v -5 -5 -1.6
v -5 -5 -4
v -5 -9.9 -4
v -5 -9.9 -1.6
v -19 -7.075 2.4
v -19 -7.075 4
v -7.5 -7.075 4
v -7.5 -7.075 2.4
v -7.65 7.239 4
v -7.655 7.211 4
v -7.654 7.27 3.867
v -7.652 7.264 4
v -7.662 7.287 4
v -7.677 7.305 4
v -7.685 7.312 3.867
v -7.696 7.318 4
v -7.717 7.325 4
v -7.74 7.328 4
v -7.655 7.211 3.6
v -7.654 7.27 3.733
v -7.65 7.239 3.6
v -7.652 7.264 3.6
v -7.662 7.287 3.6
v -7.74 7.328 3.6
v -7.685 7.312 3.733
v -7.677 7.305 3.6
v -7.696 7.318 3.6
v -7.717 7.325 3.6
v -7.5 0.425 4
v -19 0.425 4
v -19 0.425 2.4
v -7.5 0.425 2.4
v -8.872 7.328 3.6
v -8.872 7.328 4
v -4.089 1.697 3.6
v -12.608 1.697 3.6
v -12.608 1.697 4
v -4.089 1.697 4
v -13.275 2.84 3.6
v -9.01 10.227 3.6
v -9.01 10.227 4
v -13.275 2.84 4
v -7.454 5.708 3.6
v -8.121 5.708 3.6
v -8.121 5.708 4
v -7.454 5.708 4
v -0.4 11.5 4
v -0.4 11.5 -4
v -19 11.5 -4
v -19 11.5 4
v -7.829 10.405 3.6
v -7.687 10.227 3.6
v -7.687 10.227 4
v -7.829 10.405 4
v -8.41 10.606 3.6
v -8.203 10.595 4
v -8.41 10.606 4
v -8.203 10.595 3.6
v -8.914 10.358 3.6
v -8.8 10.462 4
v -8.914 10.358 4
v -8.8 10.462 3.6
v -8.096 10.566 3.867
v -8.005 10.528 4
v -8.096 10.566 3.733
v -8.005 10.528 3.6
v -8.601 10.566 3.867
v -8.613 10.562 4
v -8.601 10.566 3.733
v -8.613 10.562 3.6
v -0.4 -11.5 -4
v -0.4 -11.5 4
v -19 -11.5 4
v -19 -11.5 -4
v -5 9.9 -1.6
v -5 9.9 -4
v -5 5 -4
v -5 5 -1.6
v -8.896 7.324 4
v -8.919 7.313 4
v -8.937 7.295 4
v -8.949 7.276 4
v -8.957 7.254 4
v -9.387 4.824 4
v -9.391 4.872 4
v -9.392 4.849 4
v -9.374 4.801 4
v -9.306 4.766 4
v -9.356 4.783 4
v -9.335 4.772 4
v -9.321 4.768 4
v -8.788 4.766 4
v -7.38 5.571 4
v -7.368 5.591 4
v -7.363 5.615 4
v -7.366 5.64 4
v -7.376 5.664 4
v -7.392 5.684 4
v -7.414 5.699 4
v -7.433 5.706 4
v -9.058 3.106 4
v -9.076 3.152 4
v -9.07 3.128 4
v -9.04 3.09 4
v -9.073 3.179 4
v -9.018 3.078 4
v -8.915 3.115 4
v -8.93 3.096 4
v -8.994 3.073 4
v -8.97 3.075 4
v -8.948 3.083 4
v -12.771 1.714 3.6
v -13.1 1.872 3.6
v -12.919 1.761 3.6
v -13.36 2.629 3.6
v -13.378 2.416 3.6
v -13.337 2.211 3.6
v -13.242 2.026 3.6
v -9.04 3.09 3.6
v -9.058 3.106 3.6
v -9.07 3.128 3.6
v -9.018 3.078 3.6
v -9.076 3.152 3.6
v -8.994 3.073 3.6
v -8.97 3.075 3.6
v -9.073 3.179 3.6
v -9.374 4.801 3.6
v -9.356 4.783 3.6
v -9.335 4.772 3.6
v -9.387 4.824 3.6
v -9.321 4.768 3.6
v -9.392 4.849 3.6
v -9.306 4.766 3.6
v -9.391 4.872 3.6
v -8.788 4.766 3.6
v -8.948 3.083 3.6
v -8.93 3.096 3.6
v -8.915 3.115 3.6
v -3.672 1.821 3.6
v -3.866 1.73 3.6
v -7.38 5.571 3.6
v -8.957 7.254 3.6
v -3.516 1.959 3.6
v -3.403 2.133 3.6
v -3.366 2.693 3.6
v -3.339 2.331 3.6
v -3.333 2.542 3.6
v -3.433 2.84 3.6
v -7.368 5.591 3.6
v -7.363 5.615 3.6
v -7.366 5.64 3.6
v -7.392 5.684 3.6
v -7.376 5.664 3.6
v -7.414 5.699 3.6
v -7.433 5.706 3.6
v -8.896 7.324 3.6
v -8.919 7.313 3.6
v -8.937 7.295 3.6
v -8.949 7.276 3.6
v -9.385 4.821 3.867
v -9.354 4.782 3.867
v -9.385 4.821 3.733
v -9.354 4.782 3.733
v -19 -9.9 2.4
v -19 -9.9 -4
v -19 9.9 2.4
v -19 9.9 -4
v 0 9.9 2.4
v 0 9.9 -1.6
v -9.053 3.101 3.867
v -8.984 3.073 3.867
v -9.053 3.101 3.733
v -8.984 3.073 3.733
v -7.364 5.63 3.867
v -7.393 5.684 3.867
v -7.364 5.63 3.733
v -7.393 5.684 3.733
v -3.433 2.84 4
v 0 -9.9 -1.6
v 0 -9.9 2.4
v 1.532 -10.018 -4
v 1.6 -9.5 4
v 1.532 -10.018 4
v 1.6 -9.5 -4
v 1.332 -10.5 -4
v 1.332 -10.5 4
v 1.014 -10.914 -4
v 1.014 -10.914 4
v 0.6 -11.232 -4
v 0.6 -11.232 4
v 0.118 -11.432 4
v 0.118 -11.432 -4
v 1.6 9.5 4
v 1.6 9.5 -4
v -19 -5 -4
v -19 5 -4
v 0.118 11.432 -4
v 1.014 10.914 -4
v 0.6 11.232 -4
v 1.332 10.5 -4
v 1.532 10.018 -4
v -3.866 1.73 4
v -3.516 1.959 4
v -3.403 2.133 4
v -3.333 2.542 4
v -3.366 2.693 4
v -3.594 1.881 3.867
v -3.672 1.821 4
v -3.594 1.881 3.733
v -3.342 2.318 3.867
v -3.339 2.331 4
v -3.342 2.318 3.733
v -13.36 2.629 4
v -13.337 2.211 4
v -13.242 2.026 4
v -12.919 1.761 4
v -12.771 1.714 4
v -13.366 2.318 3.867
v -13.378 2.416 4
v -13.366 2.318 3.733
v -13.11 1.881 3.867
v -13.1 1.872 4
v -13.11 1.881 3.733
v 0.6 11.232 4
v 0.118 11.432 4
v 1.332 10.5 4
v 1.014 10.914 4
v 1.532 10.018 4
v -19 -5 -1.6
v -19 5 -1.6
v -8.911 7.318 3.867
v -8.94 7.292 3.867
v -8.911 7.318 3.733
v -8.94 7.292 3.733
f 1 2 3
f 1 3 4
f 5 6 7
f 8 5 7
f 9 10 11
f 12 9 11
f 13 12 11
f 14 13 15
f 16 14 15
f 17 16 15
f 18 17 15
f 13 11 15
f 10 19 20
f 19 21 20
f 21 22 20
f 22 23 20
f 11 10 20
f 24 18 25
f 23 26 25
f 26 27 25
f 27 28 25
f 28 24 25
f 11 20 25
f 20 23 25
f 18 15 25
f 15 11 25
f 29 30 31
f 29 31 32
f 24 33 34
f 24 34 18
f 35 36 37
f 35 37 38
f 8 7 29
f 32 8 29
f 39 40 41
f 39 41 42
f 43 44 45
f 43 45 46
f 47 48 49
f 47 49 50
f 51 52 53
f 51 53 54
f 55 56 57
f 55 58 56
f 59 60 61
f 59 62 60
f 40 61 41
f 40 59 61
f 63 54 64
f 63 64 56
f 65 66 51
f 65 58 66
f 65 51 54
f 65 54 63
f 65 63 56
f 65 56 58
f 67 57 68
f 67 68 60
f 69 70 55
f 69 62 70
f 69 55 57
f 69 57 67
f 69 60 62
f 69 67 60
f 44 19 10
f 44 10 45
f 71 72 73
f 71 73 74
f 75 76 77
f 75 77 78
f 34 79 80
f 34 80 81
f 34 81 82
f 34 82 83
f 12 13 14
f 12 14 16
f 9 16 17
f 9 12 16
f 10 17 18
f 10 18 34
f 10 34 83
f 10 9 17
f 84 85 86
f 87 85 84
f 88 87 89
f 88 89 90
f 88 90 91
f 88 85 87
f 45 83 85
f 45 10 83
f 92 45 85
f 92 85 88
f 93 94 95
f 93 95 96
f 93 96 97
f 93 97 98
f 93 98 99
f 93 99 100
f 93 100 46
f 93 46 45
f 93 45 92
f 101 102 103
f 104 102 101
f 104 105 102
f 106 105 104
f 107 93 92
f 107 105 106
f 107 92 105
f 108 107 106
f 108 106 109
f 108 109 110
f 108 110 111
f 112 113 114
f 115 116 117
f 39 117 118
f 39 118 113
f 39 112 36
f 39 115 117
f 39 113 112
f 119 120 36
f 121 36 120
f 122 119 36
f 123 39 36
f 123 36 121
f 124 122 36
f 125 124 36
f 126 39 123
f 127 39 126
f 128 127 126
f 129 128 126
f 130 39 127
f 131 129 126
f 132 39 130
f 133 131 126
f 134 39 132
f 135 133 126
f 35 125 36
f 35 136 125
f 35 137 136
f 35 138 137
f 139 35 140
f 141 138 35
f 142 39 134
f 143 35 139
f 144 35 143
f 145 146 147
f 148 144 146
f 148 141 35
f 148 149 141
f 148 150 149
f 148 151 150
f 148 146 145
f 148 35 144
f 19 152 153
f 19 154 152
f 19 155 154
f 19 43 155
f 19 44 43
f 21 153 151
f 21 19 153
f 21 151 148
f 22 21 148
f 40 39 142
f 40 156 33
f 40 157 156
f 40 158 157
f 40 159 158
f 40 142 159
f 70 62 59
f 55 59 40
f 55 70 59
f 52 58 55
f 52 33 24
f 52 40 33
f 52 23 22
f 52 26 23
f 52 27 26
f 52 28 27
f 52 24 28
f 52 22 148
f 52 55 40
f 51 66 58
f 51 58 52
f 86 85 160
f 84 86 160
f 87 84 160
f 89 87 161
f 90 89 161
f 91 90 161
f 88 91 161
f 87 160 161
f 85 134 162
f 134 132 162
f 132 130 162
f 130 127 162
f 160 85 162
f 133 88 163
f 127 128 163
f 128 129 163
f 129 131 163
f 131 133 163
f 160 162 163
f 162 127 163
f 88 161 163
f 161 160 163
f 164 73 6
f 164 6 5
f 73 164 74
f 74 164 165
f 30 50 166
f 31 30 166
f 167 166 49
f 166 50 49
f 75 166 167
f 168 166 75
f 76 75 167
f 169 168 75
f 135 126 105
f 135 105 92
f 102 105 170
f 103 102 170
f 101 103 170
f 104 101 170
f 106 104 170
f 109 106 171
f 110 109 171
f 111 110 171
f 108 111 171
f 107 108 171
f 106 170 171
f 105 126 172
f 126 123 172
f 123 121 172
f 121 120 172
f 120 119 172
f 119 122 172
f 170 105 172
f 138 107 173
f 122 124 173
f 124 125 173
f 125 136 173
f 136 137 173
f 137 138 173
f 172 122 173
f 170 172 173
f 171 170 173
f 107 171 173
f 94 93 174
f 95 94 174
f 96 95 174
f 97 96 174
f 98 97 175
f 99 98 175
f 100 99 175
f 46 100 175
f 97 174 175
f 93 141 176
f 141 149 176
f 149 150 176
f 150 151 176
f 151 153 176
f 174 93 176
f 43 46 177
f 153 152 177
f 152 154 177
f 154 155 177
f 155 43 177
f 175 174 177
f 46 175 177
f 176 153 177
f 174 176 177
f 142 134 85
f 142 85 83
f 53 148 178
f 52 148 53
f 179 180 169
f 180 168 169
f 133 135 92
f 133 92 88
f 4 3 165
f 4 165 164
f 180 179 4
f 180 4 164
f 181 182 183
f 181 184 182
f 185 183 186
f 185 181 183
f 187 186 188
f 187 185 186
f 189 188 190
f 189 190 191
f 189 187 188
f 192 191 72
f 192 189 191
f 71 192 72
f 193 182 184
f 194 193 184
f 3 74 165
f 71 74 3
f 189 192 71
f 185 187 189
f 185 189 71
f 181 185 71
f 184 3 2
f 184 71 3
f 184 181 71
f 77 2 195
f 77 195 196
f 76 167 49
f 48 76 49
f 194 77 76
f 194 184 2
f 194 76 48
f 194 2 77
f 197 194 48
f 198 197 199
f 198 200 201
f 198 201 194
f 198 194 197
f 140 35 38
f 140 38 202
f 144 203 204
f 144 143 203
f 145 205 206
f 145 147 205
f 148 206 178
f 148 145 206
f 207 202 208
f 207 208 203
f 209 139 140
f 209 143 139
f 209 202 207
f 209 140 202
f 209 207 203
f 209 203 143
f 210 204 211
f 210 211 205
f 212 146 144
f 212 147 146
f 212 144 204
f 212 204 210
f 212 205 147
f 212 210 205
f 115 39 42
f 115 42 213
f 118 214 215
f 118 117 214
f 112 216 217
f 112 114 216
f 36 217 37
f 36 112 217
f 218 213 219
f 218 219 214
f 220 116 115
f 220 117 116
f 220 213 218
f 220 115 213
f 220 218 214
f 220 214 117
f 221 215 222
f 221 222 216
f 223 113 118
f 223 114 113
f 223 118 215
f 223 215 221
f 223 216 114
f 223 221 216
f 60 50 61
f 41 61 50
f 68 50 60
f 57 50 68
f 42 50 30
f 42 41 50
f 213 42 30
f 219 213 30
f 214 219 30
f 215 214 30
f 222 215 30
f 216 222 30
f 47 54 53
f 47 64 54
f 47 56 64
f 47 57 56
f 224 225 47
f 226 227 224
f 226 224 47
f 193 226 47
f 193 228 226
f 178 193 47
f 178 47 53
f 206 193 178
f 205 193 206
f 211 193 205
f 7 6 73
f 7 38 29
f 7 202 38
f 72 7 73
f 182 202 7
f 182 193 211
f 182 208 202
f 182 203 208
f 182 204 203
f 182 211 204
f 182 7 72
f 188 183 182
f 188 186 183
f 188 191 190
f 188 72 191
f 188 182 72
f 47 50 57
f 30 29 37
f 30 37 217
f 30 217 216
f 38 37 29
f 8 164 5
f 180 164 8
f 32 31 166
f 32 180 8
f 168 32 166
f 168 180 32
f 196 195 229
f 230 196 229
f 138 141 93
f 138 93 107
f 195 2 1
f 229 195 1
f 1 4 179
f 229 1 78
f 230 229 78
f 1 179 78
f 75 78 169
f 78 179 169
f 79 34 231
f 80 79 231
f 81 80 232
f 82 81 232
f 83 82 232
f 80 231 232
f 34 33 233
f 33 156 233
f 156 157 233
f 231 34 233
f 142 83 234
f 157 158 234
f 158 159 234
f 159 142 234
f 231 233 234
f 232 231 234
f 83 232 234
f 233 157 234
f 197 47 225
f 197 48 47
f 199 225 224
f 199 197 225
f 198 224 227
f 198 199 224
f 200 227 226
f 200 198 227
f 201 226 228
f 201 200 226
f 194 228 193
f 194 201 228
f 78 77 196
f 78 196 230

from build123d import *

# Parameters (mm, degrees)
ESQUISSE1_W             = 8
ESQUISSE1_H             = 23
BOSS_EXTRU_1_DEPTH      = 1.6
ESQUISSE2_W             = 2.4
ESQUISSE2_H             = 10
BOSS_EXTRU_2_DEPTH      = 19
ESQUISSE3_W             = 2.4
ESQUISSE3_H             = 19.8
BOSS_EXTRU_3_DEPTH      = 5
ENL_V_MAT_EXTRU_1_REACH = 25.606
ESQUISSE4_W             = 11.5
ESQUISSE4_H             = 7.5
ENL_V_START             = -0.4
ENL_V_MAT_EXTRU_2_DEPTH = 0.4
CONG_1_R                = 2


# Read off the part's stored shape, not the designer's step: Enlèv. mat.-Extru.2
with BuildPart() as part:
    # Esquisse1 → Boss.-Extru.1 (new body)
    with BuildSketch(Plane(origin=(0, 0, 0), x_dir=(0, 0, -1), z_dir=(1, 0, 0))):
        Rectangle(ESQUISSE1_W, ESQUISSE1_H)
    extrude(amount=BOSS_EXTRU_1_DEPTH)

    # Esquisse2 → Boss.-Extru.2 (add)
    with BuildSketch(Plane.ZY):
        Polygon((-4, 11.5), (4, 11.5), (4, -11.5), (-4, -11.5), (-4, -9.9), (2.4, -9.9), (2.4, 9.9), (-4, 9.9), align=None)
        with Locations((-2.8, 0)):
            Rectangle(ESQUISSE2_W, ESQUISSE2_H)
    extrude(amount=BOSS_EXTRU_2_DEPTH)

    # Esquisse3 → Boss.-Extru.3 (add)
    with BuildSketch(Plane.ZY):
        with Locations((-2.8, 0)):
            Rectangle(ESQUISSE3_W, ESQUISSE3_H)
    extrude(amount=BOSS_EXTRU_3_DEPTH)

    # Esquisse4 → Enlèv. mat.-Extru.1 (cut, up to next)
    with BuildSketch(Plane.XY.offset(4), mode=Mode.PRIVATE) as enl_v_mat_extru_1_sk1:
        with Locations((-13.25, -3.325)):
            Rectangle(ESQUISSE4_W, ESQUISSE4_H)
    enl_v_mat_extru_1_tool1 = extrude(enl_v_mat_extru_1_sk1.sketch, amount=-ENL_V_MAT_EXTRU_1_REACH, mode=Mode.PRIVATE) & part.part
    add(enl_v_mat_extru_1_tool1.solids().sort_by_distance((-13.25, -3.325, 4))[0], mode=Mode.SUBTRACT)

    # Enlèv. mat.-Extru.2 outline → Enlèv. mat.-Extru.2 (cut)
    with BuildSketch(Plane.XY.offset(4).offset(ENL_V_START)):
        with BuildLine():
            Line((-12.608271193, 1.69730271), (-4.088687559, 1.69730271))
            add(Edge.make_bspline(
                [(-4.088687559, 1.69730271), (-3.506604225, 1.697303518), (-3.136187559, 2.332303518), (-3.432521215, 2.840303033)],
                knots=[5, 5, 5, 5, 6, 6, 6, 6], degree=3))
            Line((-3.432521215, 2.840303033), (-7.687021295, 10.227470021))
            add(Edge.make_bspline(
                [(-7.687021295, 10.227470021), (-7.983354547, 10.735470041), (-8.713604709, 10.735470041), (-9.009937961, 10.227470021)],
                knots=[1, 1, 1, 1, 2, 2, 2, 2], degree=3))
            Line((-9.009937961, 10.227470021), (-13.275021213, 2.840303033))
            add(Edge.make_bspline(
                [(-13.275021213, 2.840303033), (-13.571354541, 2.33230271), (-13.200937899, 1.69730271), (-12.608271193, 1.69730271)],
                knots=[3, 3, 3, 3, 4, 4, 4, 4], degree=3))
        make_face()
        with BuildLine():
            add(Edge.make_bspline(
                [(-7.380104467, 5.570803355), (-7.337771376, 5.623720022), (-7.380104467, 5.708386608), (-7.454188284, 5.708387012)],
                knots=[11, 11, 11, 11, 12, 12, 12, 12], degree=3))
            Line((-7.380104467, 5.570803355), (-8.9146878, 3.115470345))
            add(Edge.make_bspline(
                [(-9.0734378, 3.178970184), (-9.094604547, 3.083720023), (-8.967604466, 3.030803356), (-8.9146878, 3.115470345)],
                knots=[1, 1, 1, 1, 2, 2, 2, 2], degree=3))
            Line((-9.0734378, 3.178970184), (-8.787687719, 4.766470184))
            Line((-8.787687719, 4.766470184), (-9.306271214, 4.766470184))
            add(Edge.make_bspline(
                [(-9.390937799, 4.872303517), (-9.401521375, 4.81938685), (-9.35918788, 4.766470184), (-9.306271214, 4.766470184)],
                knots=[4, 4, 4, 4, 5, 5, 5, 5], degree=3))
            Line((-9.390937799, 4.872303517), (-8.957021294, 7.253553516))
            add(Edge.make_bspline(
                [(-8.872354708, 7.32763693), (-8.9146878, 7.32763693), (-8.946438123, 7.295887011), (-8.957021294, 7.253553516)],
                knots=[6, 6, 6, 6, 7, 7, 7, 7], degree=3))
            Line((-8.872354708, 7.32763693), (-7.739937961, 7.32763693))
            add(Edge.make_bspline(
                [(-7.655271375, 7.211220425), (-7.634104628, 7.274720264), (-7.676438123, 7.32763693), (-7.739937961, 7.32763693)],
                knots=[8, 8, 8, 8, 9, 9, 9, 9], degree=3))
            Line((-7.655271375, 7.211220425), (-8.120938204, 5.708387012))
            Line((-8.120938204, 5.708387012), (-7.454188284, 5.708387012))
        make_face(mode=Mode.SUBTRACT)
    extrude(amount=ENL_V_MAT_EXTRU_2_DEPTH, mode=Mode.SUBTRACT)

    # Congé1
    cong_1_edges = [part.edges().sort_by_distance(p)[0] for p in [
        (1.6, -11.5, 0),
        (1.6, 11.5, 0),
    ]]
    fillet(cong_1_edges, radius=CONG_1_R)


solid = part.part
